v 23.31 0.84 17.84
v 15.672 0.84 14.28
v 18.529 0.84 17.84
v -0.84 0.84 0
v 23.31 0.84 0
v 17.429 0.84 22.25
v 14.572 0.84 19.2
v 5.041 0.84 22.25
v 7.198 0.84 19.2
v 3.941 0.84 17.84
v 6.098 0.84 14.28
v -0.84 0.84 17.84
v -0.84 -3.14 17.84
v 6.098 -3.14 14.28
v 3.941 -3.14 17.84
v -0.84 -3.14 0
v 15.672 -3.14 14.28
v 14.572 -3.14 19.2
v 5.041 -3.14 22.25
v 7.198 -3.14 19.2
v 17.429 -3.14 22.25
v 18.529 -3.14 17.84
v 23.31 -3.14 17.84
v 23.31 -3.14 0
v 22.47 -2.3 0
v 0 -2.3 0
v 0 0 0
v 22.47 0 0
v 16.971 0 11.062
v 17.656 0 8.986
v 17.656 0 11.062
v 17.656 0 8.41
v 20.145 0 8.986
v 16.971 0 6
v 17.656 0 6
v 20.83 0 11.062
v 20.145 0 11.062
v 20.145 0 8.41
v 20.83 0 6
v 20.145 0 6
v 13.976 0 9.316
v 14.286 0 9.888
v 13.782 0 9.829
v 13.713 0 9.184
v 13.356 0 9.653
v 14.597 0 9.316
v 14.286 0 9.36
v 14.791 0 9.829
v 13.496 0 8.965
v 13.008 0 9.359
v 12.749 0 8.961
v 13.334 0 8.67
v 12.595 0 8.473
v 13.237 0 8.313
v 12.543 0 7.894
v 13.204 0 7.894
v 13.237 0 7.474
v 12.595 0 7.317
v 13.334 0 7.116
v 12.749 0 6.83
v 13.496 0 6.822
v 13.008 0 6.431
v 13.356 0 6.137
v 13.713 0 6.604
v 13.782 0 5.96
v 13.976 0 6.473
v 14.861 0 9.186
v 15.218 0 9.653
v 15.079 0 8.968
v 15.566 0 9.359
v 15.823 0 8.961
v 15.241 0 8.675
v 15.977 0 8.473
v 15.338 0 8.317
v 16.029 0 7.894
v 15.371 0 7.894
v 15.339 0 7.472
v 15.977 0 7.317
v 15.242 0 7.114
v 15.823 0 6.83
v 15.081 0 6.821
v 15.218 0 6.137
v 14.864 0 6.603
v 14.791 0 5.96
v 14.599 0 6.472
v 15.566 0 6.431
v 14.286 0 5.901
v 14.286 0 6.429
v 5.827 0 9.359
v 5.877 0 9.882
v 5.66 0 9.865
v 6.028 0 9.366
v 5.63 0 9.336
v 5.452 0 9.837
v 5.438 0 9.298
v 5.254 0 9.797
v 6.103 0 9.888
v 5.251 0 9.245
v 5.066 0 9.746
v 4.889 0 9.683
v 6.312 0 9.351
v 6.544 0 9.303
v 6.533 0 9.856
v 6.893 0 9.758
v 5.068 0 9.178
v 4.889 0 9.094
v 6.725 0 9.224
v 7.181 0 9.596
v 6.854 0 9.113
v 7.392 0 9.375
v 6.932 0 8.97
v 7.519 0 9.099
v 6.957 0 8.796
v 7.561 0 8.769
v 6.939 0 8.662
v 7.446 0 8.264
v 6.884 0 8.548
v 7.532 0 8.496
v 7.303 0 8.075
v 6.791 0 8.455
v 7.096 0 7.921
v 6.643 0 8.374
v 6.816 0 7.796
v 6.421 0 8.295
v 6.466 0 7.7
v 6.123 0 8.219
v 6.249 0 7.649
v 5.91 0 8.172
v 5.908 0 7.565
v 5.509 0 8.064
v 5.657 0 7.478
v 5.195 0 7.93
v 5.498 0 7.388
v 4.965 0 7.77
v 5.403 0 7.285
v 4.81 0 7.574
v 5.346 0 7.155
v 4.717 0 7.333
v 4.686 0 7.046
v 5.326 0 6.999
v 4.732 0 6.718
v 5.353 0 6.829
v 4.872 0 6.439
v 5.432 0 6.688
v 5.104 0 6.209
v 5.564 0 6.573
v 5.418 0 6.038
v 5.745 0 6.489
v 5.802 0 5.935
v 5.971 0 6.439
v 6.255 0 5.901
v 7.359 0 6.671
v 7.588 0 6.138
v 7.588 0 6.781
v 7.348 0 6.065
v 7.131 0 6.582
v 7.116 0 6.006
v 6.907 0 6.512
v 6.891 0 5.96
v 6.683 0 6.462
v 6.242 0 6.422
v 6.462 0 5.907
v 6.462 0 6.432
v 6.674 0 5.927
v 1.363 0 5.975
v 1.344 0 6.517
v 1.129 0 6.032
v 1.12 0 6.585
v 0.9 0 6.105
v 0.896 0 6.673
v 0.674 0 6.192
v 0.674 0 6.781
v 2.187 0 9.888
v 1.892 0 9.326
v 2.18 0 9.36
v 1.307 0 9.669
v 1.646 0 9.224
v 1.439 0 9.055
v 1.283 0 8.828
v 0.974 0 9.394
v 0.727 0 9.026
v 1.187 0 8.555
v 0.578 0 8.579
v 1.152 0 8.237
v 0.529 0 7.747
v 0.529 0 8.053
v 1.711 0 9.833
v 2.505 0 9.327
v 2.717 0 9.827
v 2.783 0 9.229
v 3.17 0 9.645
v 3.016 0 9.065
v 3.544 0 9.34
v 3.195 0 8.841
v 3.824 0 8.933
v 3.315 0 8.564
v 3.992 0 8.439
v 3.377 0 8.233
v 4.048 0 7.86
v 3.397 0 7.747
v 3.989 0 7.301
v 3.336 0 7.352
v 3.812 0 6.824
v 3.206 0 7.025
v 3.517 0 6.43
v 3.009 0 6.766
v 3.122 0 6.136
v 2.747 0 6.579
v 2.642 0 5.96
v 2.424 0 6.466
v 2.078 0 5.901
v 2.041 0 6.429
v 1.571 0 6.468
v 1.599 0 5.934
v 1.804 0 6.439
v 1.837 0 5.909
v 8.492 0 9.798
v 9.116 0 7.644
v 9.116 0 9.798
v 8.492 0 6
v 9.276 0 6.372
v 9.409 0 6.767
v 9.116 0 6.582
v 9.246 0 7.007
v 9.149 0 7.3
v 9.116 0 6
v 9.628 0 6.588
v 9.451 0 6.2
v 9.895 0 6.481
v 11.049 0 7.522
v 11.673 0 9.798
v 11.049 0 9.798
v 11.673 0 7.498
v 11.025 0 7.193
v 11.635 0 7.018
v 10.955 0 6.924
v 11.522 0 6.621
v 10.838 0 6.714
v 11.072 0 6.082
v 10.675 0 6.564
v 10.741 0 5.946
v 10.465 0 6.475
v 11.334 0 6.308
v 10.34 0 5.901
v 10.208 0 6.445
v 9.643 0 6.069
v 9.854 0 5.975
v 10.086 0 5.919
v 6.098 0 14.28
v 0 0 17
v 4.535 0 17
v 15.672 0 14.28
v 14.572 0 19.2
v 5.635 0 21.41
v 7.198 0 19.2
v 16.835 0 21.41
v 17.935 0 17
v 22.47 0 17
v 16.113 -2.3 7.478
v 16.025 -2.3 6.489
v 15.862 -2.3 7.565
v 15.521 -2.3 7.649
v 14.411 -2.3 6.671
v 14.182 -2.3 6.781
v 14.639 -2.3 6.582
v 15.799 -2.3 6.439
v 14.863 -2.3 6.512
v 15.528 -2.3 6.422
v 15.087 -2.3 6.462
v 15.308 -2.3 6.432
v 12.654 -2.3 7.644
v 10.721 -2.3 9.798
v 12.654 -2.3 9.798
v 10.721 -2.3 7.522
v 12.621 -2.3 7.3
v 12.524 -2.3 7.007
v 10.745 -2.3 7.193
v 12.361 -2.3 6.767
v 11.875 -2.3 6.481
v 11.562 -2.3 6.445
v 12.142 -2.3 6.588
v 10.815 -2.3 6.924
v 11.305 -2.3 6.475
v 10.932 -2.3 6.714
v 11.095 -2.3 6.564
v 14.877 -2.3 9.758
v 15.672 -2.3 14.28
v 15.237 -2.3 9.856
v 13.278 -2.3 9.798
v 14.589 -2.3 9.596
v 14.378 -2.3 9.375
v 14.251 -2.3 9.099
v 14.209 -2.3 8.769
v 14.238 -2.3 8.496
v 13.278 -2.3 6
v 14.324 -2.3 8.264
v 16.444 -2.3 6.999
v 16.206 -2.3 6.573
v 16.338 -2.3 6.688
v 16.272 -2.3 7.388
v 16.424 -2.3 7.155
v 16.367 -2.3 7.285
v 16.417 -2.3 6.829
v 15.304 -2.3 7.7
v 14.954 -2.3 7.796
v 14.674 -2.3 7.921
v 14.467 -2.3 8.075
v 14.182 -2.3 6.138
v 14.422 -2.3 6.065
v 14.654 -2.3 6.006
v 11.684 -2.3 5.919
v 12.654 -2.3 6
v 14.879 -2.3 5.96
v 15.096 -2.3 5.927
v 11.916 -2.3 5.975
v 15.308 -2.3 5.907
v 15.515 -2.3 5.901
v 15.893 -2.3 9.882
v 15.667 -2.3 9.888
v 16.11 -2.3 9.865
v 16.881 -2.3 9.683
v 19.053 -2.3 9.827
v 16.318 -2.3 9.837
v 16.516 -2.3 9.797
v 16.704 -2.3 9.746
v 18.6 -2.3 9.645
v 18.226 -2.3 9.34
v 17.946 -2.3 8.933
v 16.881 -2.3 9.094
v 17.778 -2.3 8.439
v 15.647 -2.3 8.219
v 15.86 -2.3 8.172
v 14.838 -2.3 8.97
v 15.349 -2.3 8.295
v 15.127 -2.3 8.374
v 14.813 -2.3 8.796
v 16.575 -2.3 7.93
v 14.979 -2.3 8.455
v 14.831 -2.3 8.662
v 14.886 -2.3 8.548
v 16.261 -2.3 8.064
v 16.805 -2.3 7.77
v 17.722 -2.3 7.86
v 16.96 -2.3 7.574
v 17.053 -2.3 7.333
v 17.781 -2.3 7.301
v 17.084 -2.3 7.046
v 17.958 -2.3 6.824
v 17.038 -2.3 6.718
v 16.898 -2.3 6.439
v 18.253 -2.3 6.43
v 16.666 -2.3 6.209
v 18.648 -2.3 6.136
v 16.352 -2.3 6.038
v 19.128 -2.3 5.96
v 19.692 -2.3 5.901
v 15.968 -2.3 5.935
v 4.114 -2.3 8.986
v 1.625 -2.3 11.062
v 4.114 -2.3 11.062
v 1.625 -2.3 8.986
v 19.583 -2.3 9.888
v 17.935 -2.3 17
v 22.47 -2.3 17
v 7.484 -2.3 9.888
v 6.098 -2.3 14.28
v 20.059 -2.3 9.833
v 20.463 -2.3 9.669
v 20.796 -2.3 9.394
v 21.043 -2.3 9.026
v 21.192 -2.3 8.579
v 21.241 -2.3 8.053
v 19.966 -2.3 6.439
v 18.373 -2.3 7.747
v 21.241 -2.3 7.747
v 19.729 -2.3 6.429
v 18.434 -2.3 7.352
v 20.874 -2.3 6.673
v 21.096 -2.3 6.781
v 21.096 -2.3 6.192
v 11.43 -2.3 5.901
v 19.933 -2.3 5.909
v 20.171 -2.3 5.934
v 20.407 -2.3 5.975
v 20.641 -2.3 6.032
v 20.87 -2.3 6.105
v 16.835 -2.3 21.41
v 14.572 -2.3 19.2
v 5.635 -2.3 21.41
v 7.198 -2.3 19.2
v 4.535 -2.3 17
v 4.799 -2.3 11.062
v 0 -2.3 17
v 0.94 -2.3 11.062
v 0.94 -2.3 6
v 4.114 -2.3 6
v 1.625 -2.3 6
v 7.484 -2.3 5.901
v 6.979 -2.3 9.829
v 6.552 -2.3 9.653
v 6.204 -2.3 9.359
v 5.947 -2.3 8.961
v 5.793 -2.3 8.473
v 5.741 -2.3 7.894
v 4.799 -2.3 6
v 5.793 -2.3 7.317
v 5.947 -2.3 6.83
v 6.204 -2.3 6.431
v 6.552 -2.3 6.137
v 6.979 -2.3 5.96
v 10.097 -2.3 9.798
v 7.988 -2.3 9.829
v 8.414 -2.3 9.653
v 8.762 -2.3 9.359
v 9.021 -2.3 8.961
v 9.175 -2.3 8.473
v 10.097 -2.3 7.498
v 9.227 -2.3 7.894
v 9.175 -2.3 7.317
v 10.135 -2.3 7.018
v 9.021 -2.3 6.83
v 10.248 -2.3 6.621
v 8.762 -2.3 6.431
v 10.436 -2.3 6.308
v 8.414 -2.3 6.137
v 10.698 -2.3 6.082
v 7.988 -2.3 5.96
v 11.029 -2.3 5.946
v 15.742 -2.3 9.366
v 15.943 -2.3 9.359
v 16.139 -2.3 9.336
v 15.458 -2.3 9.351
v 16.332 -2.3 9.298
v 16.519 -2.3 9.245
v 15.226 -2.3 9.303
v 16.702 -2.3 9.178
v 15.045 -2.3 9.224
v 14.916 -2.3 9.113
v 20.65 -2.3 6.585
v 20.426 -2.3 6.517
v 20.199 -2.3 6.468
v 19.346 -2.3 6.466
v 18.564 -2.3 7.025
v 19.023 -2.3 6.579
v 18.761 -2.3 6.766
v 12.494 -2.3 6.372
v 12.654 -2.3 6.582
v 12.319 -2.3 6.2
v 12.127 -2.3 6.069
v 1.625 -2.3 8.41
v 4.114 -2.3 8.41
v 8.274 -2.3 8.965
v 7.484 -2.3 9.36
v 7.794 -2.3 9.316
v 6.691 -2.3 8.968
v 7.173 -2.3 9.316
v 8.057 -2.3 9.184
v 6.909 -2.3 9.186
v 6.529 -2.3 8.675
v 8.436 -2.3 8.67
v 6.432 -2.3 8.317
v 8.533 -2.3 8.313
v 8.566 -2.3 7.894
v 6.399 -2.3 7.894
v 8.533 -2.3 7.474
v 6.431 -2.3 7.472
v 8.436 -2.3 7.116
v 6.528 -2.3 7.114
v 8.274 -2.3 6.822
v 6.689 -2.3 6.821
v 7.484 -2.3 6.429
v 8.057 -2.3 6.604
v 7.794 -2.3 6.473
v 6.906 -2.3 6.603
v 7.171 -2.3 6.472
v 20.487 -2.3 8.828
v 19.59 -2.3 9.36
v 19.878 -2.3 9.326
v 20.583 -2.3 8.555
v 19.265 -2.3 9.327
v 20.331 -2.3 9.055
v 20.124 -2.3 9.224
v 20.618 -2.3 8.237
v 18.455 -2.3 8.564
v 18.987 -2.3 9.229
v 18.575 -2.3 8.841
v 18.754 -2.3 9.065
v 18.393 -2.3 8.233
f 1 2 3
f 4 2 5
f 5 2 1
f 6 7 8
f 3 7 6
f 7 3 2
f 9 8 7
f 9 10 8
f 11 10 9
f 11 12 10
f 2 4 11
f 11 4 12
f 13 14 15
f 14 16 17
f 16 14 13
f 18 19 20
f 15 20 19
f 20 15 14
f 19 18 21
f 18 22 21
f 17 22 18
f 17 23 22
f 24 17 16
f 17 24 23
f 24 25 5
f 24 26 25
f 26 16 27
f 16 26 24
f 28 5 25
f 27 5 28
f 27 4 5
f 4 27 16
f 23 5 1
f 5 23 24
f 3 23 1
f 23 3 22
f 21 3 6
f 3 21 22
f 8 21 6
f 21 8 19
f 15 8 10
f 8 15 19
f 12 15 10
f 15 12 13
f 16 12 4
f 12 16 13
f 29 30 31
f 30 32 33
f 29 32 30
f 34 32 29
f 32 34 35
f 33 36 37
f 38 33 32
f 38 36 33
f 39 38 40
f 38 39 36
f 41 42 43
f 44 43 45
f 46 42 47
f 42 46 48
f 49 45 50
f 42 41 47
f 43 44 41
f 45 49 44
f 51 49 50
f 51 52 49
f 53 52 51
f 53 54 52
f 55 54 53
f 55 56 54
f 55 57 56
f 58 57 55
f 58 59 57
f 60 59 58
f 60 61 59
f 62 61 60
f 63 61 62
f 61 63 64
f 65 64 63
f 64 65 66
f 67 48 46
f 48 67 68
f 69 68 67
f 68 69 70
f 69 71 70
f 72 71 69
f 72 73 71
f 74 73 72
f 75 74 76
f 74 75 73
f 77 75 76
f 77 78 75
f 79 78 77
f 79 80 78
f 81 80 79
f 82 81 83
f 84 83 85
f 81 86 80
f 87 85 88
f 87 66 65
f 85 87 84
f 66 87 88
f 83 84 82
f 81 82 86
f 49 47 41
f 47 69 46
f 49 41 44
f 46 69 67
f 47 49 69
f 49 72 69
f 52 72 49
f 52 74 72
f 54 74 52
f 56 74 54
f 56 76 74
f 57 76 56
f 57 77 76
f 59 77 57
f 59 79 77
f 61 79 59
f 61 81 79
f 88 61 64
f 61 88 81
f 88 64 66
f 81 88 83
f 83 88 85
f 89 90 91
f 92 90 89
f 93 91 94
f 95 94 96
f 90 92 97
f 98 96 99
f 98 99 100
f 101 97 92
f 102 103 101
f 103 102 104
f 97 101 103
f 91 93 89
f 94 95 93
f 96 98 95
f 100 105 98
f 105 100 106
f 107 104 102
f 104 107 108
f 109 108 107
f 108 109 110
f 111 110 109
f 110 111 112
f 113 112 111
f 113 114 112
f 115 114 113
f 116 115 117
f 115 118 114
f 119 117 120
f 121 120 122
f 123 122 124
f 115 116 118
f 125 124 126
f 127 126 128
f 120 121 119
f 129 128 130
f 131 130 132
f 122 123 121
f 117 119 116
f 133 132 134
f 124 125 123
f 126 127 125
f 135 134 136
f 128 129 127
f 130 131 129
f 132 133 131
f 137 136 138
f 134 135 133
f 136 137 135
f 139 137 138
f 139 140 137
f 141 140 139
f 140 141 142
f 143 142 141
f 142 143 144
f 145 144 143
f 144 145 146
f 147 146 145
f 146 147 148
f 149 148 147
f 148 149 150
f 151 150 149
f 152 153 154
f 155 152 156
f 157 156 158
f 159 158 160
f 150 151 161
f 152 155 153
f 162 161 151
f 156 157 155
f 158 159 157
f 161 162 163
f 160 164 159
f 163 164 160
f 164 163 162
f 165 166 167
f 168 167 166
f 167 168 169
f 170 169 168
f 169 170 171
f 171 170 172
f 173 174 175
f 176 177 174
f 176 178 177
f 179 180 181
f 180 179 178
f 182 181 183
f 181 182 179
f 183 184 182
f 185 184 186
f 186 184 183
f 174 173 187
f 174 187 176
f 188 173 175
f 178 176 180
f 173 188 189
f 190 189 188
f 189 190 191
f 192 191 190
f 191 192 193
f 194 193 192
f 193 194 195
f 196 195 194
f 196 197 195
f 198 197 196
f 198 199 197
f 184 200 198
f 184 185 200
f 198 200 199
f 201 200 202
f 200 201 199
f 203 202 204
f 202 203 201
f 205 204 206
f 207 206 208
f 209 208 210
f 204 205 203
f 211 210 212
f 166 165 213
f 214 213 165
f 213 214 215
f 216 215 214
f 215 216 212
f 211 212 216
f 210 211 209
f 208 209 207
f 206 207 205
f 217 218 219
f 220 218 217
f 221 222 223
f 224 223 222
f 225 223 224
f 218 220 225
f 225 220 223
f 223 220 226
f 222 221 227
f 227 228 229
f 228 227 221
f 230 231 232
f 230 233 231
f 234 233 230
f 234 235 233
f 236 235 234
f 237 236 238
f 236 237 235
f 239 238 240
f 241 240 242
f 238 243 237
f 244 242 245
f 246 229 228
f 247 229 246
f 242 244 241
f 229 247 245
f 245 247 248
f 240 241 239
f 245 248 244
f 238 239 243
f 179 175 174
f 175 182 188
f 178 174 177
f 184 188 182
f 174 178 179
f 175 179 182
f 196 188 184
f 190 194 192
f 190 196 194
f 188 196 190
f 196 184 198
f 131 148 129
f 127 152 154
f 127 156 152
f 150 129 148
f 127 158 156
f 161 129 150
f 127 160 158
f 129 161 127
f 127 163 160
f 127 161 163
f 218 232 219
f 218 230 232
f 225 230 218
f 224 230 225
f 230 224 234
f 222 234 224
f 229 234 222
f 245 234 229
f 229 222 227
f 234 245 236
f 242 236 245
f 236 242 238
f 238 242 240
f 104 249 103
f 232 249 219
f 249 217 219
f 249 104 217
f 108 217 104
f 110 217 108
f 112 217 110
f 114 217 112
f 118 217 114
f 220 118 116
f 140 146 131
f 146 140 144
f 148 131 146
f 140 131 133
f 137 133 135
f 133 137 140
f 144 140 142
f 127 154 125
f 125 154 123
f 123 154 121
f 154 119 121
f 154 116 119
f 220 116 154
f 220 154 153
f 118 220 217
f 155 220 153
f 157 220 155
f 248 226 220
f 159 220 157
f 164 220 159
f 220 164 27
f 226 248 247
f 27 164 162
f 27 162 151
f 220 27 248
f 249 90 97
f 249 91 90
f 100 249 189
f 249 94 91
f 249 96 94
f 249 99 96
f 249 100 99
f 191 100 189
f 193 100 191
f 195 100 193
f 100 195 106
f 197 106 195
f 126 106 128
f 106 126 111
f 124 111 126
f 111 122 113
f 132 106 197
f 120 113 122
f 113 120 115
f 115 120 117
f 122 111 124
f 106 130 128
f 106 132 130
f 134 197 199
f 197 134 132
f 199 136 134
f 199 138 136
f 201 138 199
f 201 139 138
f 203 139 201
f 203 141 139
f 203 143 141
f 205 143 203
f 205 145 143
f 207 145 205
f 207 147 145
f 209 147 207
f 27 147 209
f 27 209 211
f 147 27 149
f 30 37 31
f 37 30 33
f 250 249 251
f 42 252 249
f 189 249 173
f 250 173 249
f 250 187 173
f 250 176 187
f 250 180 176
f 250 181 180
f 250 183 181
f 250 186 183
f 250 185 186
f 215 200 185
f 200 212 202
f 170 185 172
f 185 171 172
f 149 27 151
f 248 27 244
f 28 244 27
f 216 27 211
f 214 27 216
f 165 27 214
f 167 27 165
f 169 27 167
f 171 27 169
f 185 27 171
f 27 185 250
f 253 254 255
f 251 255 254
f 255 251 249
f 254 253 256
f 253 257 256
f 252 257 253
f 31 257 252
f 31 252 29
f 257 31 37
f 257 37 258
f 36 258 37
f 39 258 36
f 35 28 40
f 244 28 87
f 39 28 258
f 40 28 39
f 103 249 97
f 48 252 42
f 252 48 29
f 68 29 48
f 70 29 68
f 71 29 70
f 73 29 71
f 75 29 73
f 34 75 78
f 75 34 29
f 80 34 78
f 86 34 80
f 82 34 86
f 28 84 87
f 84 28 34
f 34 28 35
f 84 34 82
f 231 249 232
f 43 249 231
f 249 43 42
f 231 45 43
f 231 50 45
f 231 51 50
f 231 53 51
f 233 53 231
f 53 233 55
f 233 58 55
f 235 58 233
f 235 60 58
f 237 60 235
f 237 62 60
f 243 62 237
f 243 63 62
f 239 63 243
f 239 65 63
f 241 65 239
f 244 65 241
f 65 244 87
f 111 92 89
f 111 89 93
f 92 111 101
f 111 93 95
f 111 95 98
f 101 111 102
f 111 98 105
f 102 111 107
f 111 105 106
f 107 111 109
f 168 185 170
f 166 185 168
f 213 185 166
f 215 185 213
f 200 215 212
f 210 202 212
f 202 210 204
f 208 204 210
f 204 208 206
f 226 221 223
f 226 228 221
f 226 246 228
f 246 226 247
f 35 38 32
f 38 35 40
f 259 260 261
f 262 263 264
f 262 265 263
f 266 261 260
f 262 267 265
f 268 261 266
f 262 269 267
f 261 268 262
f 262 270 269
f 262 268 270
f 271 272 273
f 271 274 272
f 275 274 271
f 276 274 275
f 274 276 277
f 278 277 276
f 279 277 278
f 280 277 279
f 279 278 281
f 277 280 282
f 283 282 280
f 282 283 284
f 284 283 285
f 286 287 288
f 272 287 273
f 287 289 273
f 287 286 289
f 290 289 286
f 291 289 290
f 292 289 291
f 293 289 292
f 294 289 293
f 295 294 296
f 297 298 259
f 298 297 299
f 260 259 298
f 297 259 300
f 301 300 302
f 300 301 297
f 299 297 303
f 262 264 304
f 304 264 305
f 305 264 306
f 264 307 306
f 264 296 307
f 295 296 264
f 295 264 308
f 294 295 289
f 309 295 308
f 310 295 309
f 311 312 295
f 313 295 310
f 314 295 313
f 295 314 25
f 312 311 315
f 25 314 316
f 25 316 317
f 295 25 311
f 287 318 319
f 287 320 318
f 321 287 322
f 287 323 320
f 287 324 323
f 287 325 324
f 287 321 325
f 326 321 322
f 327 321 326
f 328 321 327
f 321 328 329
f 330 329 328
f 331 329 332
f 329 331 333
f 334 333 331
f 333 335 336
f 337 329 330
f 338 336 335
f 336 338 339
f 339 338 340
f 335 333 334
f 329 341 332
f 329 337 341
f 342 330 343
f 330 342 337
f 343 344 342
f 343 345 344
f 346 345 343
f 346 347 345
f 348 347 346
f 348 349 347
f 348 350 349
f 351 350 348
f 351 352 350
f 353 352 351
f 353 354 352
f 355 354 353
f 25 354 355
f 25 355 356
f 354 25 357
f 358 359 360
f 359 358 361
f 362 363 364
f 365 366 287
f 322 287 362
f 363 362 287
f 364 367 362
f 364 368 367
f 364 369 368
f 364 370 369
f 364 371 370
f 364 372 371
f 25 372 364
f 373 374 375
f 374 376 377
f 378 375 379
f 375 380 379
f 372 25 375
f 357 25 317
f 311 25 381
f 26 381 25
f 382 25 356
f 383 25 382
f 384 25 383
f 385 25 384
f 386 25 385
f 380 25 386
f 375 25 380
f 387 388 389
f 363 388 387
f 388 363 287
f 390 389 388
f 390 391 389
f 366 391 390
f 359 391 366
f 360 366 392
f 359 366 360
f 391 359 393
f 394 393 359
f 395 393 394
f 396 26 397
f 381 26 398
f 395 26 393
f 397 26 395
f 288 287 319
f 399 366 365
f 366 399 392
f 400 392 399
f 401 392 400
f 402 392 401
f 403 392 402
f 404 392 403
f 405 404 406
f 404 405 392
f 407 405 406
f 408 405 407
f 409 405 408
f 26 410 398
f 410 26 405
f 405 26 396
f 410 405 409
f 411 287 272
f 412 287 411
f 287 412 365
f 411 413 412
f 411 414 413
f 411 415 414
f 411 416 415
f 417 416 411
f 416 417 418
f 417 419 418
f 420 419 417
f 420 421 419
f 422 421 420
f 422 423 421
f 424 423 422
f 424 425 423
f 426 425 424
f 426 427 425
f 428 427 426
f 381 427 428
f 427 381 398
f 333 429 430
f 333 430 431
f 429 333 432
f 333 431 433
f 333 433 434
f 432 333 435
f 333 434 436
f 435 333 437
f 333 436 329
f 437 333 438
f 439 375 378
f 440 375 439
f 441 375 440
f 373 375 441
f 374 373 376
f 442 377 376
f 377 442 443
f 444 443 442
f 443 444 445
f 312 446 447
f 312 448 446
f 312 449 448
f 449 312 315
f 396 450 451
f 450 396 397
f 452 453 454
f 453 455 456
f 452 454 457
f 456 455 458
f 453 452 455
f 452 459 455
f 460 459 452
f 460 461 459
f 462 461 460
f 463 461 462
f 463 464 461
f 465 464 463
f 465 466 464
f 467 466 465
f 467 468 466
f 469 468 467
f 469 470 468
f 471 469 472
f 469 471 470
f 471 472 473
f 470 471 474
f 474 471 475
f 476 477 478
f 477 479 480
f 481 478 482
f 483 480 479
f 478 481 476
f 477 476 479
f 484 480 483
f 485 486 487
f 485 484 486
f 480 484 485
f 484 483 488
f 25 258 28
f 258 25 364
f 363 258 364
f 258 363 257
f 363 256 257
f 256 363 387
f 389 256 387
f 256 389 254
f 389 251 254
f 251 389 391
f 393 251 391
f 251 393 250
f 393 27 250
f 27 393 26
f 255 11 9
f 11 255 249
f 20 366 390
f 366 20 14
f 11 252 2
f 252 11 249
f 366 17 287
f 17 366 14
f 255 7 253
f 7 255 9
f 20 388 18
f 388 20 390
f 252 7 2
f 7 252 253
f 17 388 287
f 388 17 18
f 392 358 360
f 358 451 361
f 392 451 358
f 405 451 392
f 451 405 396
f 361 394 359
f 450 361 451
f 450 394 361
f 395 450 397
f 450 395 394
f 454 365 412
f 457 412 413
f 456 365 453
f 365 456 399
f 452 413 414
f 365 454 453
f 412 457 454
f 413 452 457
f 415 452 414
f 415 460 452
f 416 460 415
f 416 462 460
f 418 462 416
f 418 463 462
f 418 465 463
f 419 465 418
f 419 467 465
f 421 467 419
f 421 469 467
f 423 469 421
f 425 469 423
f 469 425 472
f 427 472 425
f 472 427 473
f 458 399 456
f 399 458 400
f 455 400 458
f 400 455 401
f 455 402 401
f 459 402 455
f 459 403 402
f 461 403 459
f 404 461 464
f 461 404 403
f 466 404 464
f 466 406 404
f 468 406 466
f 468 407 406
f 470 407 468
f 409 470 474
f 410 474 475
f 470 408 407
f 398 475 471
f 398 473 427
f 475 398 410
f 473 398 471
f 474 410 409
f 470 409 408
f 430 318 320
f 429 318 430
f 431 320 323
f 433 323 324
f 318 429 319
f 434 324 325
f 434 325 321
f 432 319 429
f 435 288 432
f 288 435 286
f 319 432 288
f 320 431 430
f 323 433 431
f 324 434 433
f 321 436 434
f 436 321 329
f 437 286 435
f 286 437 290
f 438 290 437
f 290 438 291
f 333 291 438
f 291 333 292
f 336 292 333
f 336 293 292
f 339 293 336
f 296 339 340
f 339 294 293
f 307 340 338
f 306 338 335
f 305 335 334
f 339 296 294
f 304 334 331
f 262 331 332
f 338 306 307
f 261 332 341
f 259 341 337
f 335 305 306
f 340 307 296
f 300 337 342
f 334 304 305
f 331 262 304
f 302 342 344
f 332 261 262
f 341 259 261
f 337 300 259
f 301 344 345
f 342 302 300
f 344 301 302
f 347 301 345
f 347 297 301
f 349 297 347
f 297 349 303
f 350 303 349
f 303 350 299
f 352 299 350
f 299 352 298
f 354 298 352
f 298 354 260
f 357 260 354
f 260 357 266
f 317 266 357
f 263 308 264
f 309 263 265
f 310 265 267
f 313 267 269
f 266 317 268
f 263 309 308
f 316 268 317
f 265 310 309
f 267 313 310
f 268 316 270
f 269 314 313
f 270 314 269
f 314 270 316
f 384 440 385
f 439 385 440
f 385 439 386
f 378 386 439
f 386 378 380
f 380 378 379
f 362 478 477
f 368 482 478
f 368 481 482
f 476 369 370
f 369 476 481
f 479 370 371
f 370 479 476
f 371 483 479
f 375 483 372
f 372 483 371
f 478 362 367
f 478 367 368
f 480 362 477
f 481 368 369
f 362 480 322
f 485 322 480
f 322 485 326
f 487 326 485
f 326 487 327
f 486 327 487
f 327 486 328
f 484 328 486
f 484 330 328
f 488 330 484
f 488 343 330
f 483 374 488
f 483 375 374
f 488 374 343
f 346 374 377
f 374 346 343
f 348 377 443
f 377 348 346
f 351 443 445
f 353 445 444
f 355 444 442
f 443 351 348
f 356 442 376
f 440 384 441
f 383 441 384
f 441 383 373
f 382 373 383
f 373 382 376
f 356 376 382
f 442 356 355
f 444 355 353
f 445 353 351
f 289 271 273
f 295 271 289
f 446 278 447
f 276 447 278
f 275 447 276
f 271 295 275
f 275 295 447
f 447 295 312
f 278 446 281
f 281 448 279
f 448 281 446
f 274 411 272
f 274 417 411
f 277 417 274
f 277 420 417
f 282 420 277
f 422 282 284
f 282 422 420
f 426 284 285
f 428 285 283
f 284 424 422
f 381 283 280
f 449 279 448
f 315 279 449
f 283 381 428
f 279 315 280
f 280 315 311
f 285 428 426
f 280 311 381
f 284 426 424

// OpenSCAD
// Key cover or key "sock" for a WR5 / KW1 square block key
//
// Commonly used for American house keys
// particularly Weiser and Kwickset
// Sample blank: https://discountdoorhardware.ca/product/weiser-wr5-keyway-5-pin-key-blank-brass/
//
// All dimensions in mm

// Label on key
key_label = "House";

font = "Aldo";
font_size = 5;

/// Generate key sock!

// thickness "front to back", laying flat on the table; Weiser default is 2.00mm
key_thickness = 2.00;  // 0.01
// laying flat, the "left to right" of the main body; Weiser default is 21.77mm, Minute Key default is 22.15mm
key_box_width = 21.77;  // 0.01
// laying flat, the "up to down" of the main body; Weiser default is 17.00mm
key_box_height = 17.00;  // 0.01
// ??; Weiser default is 13.00mm
key_top_base_width = 13.00;  // 0.01
// measured along the "top edge" of the key, how wide are the shoulders that stick up?; Weiser default is 12.70mm
key_top_shoulder_width = 12.7;  // 0.01
// at the top of the "key hole bump", how wide is the top edge? The bottom of the keyhole is assumed to be this wide as well.; Weiser default is 10.50mm
key_top_top_width = 10.5;  // 0.01
// how much does the "key hole bump" sick "up" above the main body of the key?; Weiser default is 4.41mm
key_top_extra_height = 4.41;  // 0.01
// on the "key hole bump", how tall is the band between the top edge and the keyhole?; Weiser default is 2.21mm
key_top_thickness = 2.21;  // 0.01
// the "up to down" of the top keyhole; Weiser default is 4.92mm
key_hole_height = 4.92;  // 0.01

// how thick do you want the cover? Tip: set this to a multiple of your print line width.; personal default is 0.84mm
sock_thickness = 0.84;  // 0.01

// additional clearance (c.f. tolerance) to width of the key; default is 0.70mm
clearance_width = 0.70;  // 0.01
// additional clearance (c.f. tolerance) to thickness of the key; default is 0.30mm
clearance_depth = 0.30;  // 0.01
//text_delta_y = 0;


// Minute Key measurements
// =======================
// key_thickness = 1.98;
// key_box_width = 22.15;  // * note change
// key_box_height = 17.04;
// key_top_shoulder_width = 12.7;
// key_top_top_width = 10.5;
// key_top_extra_height = 4.3;  // * note change
// key_top_thickness = 2.25;
// key_hole_height = 4.96;


// how far outside the "box" to show removals (in OpenSCAD rendering)
overcut_distance = 5;  // 0.1

key_top_shoulder = (key_box_width - key_top_shoulder_width) / 2;
full_thickness = key_thickness + sock_thickness * 2;
inside_bottom = sock_thickness;
inside_top = key_thickness + sock_thickness;
inside_low_x = sock_thickness;
inside_high_x = key_box_width - sock_thickness;
inside_box_high_y = key_box_height - sock_thickness;

// the contours of the key head
module _sock(x_1, x_2, x_3, x_4, x_5, x_6, y_1, y_2, y_3, z_1, z_2) {
    polyhedron(
        points = [
            [x_1, y_1, z_1],  // 0
            [x_6, y_1, z_1],
            [x_6, y_2, z_1],
            [x_5, y_2, z_1],
            [x_4, y_3, z_1],
            [x_3, y_3, z_1],
            [x_2, y_2, z_1],
            [x_1, y_2, z_1],  // 7

            [x_1, y_1, z_2],  // 8
            [x_6, y_1, z_2],
            [x_6, y_2, z_2],
            [x_5, y_2, z_2],
            [x_4, y_3, z_2],
            [x_3, y_3, z_2],
            [x_2, y_2, z_2],
            [x_1, y_2, z_2]  // 15
        ],
        faces = [
            [0, 1, 2, 3, 4, 5, 6, 7],
            [15, 14, 13, 12, 11, 10, 9, 8],
            [ 8,  9, 1, 0],
            [ 9, 10, 2, 1],
            [10, 11, 3, 2],
            [11, 12, 4, 3],
            [12, 13, 5, 4],
            [13, 14, 6, 5],
            [14, 15, 7, 6],
            [15,  8, 0, 7]
        ],
        convexity = 10
    );
}

// the contours of the keyhole
module _keyhole(x_1, x_2, x_3, x_4, y_1, y_2, z_1, z_2) {
    polyhedron(
        points = [
            [x_1, y_1, z_1],  // 0
            [x_4, y_1, z_1],
            [x_3, y_2, z_1],
            [x_2, y_2, z_1],  // 3

            [x_1, y_1, z_2],  // 4
            [x_4, y_1, z_2],
            [x_3, y_2, z_2],
            [x_2, y_2, z_2]   // 7
        ],
        faces = [
            [0, 1, 2, 3],
            [7, 6, 5, 4],
            [4, 5, 1, 0],
            [5, 6, 2, 1],
            [6, 7, 3, 2],
            [7, 4, 0, 3],
        ],
        convexity = 10
    );
}


module sock_outside() {
    _sock(
        // "left" edge
        x_1 = -sock_thickness,
        // x edges of top box on key
        x_2 = key_top_shoulder - sock_thickness / sqrt(2),
        x_3 = (key_box_width - key_top_top_width) / 2 - sock_thickness / sqrt(2),
        x_4 = (key_box_width + key_top_top_width) / 2 + sock_thickness / sqrt(2) + clearance_width,
        x_5 = key_box_width - (key_top_shoulder - sock_thickness / sqrt(2)) + clearance_width,
        // "right" edge
        x_6 = key_box_width + sock_thickness + clearance_width,

        y_1 = 0,
        y_2 = key_box_height + sock_thickness,
        y_3 = key_box_height + key_top_extra_height + sock_thickness,

        z_1 = -sock_thickness,
        z_2 = key_thickness + sock_thickness + clearance_depth
    );
}

module sock_inside() {
    _sock(
        // "left" edge
        x_1 = 0,
        // x edges of top box on key
        x_2 = key_top_shoulder,
        x_3 = (key_box_width - key_top_top_width) / 2,
        x_4 = (key_box_width + key_top_top_width) / 2 + clearance_width,
        x_5 = key_box_width - key_top_shoulder + clearance_width,
        // "right" edge
        x_6 = key_box_width + clearance_width,

        y_1 = -overcut_distance,
        y_2 = key_box_height,
        y_3 = key_box_height + key_top_extra_height,

        z_1 = 0,
        z_2 = key_thickness + clearance_depth
    );
}

module my_keyhole() {
    _keyhole(
        x_1 = (key_box_width - key_top_shoulder_width) / 2 + key_top_thickness / sqrt(2),
        x_2 = (key_box_width - key_top_top_width) / 2 + key_top_thickness / sqrt(2),
        x_3 = (key_box_width + key_top_top_width) / 2 - key_top_thickness / sqrt(2),
        x_4 = (key_box_width + key_top_shoulder_width) / 2 - key_top_thickness / sqrt(2),
        y_1 = key_box_height + key_top_extra_height - key_hole_height - key_top_thickness,
        y_2 = key_box_height + key_top_extra_height - key_top_thickness,
        z_1 = -overcut_distance,
        z_2 = key_thickness + sock_thickness + overcut_distance);
}

module key_labels(extra_depth = 0) {
    translate(v = [
        key_box_width / 2,
        (key_box_height - font_size) / 2,
        key_thickness + clearance_depth - extra_depth
    ])
    linear_extrude(height = sock_thickness + extra_depth * 2)
    text(
        key_label,
        size = font_size,
        font = font,
        halign = "center",
        valign = "baseline"
    );

    translate(v = [
        key_box_width / 2,
        (key_box_height - font_size) / 2,
        0 - extra_depth
    ])
    rotate([0, 180, 0])
    linear_extrude(height = sock_thickness + extra_depth * 2)
    text(
        key_label,
        size = font_size,
        font = font,
        halign = "center",
        valign = "baseline"
    );
}

module key_sock() {
    // put vertical on build plate
    rotate(a = [90, 0, 0]) 
    difference() {
        sock_outside();

        sock_inside();
        my_keyhole();

        key_labels(extra_depth = 0.5);
    }
}


module shapes_test() {
    sock_outside();

    translate(v = [0, 0, key_thickness + sock_thickness])
        color("red")
        sock_inside();

    translate(v = [0, 0, key_thickness + sock_thickness])
        color("green")
        my_keyhole();
}

color("green")
key_sock();

color("snow")
rotate(a = [90, 0, 0])
key_labels(extra_depth = 0);
